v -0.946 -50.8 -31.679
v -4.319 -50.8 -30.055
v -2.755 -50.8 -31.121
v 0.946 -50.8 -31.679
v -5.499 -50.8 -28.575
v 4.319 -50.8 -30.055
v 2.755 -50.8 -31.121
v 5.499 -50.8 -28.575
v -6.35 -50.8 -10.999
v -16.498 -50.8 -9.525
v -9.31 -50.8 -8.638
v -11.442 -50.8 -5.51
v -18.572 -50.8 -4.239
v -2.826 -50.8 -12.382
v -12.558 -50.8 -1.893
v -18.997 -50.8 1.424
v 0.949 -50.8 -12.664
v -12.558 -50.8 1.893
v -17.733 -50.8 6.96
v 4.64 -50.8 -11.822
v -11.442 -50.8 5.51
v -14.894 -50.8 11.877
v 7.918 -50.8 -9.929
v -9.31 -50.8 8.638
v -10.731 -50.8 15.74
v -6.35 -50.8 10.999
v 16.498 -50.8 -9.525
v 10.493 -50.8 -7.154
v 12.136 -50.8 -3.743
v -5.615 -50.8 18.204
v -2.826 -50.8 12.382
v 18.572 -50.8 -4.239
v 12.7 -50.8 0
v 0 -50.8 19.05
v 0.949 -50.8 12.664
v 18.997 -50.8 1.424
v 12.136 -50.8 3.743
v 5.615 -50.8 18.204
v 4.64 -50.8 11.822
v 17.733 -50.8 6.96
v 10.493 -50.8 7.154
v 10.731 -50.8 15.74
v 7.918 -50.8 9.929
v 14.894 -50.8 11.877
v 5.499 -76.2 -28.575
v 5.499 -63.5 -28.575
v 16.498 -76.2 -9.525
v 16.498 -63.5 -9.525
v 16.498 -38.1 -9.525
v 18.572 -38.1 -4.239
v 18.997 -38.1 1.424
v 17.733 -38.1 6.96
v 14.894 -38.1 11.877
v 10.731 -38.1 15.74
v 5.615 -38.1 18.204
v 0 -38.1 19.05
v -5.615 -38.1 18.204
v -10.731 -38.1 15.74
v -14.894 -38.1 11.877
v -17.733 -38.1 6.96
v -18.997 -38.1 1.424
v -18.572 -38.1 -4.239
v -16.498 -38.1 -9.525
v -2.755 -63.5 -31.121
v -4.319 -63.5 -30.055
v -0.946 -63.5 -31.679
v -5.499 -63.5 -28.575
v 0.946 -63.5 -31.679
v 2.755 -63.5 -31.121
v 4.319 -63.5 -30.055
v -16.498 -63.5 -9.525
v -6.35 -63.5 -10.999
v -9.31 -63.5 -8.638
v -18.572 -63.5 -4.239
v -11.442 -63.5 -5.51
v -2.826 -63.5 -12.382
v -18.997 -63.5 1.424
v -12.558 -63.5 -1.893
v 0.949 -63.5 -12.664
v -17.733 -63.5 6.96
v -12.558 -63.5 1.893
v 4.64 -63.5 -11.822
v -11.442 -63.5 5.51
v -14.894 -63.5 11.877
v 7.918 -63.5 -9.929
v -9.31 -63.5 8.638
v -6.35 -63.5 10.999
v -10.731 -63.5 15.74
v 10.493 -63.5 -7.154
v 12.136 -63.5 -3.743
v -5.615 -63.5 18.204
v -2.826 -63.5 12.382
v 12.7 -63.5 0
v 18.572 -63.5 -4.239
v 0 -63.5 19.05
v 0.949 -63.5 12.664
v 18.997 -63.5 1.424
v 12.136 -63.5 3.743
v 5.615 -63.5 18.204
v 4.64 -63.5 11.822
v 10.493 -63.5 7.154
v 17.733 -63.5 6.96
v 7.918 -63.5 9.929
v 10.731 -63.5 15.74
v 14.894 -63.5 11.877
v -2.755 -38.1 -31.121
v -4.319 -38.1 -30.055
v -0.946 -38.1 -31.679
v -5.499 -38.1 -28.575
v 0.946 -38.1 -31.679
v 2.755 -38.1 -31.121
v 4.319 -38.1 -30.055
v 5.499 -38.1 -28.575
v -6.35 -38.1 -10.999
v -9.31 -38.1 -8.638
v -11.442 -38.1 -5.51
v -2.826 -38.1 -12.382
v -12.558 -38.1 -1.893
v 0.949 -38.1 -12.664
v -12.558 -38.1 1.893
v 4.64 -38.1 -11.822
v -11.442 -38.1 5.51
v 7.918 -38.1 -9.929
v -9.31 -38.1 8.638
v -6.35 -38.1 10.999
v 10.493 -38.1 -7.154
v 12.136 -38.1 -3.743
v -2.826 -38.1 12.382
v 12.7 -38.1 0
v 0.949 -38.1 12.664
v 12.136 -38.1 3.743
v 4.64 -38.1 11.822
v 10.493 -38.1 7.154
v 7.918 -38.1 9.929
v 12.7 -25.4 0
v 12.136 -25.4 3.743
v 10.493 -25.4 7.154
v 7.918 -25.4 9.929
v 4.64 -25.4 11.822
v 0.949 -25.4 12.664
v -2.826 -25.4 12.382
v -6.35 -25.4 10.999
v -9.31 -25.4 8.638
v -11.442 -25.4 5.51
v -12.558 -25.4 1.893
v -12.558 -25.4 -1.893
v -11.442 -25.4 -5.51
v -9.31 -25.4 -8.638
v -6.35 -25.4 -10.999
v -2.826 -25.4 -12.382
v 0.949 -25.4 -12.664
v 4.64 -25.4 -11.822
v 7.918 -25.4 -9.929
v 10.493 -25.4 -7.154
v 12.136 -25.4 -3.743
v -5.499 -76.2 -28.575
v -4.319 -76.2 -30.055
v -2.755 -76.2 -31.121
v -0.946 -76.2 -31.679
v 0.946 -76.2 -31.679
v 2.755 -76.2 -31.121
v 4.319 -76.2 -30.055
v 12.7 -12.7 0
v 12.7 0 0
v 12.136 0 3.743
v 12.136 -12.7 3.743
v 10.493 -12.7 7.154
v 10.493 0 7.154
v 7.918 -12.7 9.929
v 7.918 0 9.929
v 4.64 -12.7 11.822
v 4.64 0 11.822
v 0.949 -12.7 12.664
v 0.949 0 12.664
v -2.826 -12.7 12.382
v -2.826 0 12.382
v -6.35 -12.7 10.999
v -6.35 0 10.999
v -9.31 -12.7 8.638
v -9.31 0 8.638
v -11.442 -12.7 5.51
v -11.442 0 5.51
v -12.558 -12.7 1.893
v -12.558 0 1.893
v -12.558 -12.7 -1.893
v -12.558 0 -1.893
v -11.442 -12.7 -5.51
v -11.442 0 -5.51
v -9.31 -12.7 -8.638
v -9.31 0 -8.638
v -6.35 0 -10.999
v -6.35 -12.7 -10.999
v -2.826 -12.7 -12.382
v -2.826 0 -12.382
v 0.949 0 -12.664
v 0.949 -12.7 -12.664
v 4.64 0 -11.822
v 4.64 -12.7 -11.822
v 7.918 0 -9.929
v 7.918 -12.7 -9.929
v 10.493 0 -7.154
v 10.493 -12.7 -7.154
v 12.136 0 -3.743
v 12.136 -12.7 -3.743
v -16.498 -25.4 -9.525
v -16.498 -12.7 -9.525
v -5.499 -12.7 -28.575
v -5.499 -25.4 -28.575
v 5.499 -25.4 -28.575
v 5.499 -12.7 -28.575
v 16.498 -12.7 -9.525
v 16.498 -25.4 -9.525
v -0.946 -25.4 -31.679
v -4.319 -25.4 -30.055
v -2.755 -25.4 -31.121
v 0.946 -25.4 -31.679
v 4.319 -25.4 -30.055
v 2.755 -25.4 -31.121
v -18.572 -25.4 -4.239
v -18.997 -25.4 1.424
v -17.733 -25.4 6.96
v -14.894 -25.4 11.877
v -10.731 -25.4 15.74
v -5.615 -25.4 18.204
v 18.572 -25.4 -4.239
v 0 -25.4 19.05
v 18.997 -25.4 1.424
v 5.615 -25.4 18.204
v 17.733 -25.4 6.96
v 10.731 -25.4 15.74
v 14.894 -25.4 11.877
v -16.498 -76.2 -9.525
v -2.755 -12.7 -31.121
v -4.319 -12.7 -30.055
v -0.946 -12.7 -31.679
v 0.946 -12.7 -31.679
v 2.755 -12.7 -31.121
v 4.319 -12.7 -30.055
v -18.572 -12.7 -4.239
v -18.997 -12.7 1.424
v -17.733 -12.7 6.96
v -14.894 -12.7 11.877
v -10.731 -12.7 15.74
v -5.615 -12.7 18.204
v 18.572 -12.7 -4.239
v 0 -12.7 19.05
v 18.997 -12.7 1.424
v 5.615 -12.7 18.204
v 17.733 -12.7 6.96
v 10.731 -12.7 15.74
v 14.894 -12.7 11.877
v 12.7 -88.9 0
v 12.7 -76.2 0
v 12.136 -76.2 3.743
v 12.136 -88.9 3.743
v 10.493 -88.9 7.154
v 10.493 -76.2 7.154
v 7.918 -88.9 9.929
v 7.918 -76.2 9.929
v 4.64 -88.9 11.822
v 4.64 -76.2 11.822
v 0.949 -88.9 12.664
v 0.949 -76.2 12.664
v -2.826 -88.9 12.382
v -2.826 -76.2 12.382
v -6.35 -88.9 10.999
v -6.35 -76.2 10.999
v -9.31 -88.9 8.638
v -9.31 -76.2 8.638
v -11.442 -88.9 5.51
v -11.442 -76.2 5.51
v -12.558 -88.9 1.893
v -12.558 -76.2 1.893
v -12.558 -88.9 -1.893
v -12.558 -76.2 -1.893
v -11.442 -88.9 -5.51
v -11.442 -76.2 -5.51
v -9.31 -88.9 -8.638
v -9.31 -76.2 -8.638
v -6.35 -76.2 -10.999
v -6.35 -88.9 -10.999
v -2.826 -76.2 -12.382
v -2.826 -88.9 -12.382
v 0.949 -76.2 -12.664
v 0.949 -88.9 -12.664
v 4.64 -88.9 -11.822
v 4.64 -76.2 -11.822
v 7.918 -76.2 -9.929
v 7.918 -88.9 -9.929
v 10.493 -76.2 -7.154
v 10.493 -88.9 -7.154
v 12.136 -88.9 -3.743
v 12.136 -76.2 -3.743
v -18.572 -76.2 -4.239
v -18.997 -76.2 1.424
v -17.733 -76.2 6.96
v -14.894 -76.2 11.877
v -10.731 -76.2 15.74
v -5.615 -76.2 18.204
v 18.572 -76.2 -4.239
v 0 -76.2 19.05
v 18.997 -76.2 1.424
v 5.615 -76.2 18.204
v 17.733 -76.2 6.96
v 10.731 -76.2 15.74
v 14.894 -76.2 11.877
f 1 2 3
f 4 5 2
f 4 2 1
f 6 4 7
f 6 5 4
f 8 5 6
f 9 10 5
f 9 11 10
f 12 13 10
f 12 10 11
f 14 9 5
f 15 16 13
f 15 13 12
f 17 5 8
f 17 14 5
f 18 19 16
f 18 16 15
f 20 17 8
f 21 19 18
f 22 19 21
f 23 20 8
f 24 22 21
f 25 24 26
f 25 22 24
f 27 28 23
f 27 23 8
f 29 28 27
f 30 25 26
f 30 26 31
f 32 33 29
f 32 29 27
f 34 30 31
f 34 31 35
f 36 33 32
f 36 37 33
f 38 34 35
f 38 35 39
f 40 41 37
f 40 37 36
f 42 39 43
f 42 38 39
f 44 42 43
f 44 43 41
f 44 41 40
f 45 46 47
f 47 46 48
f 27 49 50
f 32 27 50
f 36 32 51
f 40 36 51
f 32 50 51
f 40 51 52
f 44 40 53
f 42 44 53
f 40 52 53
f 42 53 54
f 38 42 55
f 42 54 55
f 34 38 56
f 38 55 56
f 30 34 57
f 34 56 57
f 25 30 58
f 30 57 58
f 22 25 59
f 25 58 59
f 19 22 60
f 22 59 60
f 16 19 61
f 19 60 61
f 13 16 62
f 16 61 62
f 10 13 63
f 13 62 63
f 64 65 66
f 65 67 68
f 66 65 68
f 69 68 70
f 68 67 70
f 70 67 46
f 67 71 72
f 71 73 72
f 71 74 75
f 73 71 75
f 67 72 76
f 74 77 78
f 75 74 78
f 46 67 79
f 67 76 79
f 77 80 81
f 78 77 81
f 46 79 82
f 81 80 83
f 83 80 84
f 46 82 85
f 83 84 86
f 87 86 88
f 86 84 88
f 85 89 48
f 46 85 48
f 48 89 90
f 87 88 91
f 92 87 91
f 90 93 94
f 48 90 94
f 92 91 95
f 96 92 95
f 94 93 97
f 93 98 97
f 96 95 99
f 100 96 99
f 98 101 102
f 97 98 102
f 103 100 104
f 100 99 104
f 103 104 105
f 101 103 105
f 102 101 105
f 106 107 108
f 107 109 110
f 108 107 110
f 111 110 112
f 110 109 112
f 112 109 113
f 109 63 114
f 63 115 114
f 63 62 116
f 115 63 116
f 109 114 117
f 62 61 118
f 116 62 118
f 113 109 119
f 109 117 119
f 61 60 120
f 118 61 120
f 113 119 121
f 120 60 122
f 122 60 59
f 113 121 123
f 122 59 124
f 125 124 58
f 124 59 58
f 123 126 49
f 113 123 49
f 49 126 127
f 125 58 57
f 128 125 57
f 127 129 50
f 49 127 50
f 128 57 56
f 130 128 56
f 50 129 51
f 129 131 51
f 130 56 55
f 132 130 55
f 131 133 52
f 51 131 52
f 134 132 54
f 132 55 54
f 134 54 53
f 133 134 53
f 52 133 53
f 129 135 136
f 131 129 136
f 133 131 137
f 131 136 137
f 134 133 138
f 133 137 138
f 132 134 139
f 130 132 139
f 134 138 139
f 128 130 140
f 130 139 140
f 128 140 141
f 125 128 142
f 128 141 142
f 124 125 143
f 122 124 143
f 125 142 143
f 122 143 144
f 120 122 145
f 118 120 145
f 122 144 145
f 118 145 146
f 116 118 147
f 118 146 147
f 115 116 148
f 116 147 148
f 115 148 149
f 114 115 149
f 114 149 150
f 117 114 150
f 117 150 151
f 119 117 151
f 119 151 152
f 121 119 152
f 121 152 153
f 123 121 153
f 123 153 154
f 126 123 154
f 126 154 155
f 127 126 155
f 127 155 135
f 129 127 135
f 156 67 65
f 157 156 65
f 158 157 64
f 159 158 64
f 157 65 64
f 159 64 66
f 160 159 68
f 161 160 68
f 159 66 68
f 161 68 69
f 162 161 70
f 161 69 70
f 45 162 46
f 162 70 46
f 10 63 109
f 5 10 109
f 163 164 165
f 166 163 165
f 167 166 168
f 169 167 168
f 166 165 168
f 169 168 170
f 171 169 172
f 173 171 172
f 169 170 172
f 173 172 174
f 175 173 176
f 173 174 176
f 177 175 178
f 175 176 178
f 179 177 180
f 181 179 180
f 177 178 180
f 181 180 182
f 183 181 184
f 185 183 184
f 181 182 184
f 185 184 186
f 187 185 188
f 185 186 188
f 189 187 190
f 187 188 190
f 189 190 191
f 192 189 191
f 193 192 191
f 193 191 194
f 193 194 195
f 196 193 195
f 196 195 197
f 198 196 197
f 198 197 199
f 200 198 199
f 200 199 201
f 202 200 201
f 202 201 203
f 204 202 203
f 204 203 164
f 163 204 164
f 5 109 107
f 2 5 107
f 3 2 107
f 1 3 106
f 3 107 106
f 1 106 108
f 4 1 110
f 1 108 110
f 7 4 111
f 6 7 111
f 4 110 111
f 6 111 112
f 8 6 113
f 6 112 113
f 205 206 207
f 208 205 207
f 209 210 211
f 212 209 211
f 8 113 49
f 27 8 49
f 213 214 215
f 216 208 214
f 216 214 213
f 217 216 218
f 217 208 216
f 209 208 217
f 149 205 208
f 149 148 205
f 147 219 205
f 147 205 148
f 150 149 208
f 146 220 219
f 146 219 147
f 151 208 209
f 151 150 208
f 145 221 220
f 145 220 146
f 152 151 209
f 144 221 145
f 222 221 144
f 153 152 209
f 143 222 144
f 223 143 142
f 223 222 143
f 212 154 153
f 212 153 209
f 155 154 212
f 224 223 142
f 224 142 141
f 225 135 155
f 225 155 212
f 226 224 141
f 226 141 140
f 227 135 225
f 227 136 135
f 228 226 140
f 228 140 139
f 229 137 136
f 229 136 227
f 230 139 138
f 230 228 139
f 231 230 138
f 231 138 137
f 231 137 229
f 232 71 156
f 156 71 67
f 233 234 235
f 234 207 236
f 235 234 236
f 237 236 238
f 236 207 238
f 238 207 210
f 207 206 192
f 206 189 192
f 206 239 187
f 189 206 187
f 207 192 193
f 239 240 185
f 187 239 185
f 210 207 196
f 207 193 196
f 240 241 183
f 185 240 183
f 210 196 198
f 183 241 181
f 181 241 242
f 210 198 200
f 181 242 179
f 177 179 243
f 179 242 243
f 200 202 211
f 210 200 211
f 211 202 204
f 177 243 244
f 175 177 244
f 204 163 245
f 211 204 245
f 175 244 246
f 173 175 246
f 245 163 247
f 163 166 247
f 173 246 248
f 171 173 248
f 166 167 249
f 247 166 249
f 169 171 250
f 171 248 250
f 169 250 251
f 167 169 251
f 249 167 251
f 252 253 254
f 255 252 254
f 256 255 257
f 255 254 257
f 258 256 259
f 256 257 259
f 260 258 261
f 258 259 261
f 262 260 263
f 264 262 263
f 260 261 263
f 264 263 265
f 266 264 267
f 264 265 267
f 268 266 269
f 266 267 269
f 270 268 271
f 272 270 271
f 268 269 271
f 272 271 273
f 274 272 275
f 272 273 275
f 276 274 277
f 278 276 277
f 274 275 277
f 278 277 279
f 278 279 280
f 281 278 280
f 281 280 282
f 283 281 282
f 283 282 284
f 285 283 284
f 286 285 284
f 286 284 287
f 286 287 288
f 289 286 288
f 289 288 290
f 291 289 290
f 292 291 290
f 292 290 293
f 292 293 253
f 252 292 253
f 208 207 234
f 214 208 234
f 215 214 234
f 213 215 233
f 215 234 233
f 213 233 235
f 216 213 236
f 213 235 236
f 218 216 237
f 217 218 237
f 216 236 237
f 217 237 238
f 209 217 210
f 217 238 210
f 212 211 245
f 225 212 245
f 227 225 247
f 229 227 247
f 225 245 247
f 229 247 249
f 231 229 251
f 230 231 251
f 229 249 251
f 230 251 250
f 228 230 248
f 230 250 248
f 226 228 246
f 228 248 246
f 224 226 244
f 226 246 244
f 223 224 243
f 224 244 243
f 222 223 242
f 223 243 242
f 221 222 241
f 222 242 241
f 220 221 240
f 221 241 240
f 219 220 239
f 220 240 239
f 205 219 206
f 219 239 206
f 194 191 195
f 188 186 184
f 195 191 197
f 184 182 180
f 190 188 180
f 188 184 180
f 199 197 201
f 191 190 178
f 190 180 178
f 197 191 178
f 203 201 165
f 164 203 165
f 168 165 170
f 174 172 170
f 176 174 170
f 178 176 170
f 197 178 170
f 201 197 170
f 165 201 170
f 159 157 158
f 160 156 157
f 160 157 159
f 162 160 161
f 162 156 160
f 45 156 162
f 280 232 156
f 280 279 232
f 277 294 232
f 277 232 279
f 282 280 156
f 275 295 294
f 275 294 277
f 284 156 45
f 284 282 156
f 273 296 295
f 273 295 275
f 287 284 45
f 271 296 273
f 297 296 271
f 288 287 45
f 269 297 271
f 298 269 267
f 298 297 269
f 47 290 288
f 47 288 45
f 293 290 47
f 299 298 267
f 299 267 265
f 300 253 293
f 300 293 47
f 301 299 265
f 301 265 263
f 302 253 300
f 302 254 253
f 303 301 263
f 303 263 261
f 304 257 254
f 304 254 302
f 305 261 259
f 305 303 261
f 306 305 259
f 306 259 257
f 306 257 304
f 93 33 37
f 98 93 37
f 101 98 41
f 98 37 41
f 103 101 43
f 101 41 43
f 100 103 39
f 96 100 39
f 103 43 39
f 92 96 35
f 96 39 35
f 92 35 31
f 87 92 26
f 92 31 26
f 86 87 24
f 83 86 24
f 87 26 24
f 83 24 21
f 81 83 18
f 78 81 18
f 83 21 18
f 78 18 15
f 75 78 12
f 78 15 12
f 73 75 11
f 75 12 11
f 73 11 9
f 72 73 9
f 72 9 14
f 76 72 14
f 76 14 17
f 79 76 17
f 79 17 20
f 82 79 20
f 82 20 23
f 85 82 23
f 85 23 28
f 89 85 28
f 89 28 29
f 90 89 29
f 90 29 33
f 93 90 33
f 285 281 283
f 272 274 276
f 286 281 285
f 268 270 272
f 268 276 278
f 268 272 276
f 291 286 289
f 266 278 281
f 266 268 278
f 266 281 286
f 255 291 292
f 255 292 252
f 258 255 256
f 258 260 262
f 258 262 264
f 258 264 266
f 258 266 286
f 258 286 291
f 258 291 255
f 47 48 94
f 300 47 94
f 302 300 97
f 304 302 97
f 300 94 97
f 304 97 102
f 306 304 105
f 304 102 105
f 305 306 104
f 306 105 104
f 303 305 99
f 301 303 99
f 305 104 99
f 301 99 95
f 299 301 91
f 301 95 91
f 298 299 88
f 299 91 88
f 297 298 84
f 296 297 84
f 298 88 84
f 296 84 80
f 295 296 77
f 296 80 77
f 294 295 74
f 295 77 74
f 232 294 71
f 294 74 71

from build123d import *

# Parameters (mm, degrees)
F0_R      = 12.7
F1_DEPTH  = 88.9
F3_R      = 12.7
F4_DEPTH  = 12.7
F6_R      = 12.7
F7_DEPTH  = 12.7
F9_R      = 12.7
F10_DEPTH = 12.7


with BuildPart() as f1:
    # F0 (on Front) → F1 (new body)
    with BuildSketch(Plane.XZ):
        Circle(F0_R)
    extrude(amount=F1_DEPTH)

    # F3 (on offset) → F4 (join)
    with BuildSketch(Plane.XZ.offset(12.7)):
        with BuildLine():
            Line((5.499261, -28.575), (16.497784, -9.525))
            ThreePointArc((16.497784, -9.525), (0, 19.05), (-16.497784, -9.525))
            Line((-16.497784, -9.525), (-5.499261, -28.575))
            ThreePointArc((-5.499261, -28.575), (0, -31.75), (5.499261, -28.575))
        make_face()
        Circle(F3_R, mode=Mode.SUBTRACT)
    extrude(amount=F4_DEPTH)

    # F6 (on offset) → F7 (join)
    with BuildSketch(Plane.XZ.offset(38.1)):
        with BuildLine():
            Line((5.499261, -28.575), (16.497784, -9.525))
            ThreePointArc((16.497784, -9.525), (0, 19.05), (-16.497784, -9.525))
            Line((-16.497784, -9.525), (-5.499261, -28.575))
            ThreePointArc((-5.499261, -28.575), (0, -31.75), (5.499261, -28.575))
        make_face()
        Circle(F6_R, mode=Mode.SUBTRACT)
    extrude(amount=F7_DEPTH)

    # F9 (on offset) → F10 (join)
    with BuildSketch(Plane.XZ.offset(63.5)):
        with BuildLine():
            Line((5.499261, -28.575), (16.497784, -9.525))
            ThreePointArc((16.497784, -9.525), (0, 19.05), (-16.497784, -9.525))
            Line((-16.497784, -9.525), (-5.499261, -28.575))
            ThreePointArc((-5.499261, -28.575), (0, -31.75), (5.499261, -28.575))
        make_face()
        Circle(F9_R, mode=Mode.SUBTRACT)
    extrude(amount=F10_DEPTH)


solid = f1.part
